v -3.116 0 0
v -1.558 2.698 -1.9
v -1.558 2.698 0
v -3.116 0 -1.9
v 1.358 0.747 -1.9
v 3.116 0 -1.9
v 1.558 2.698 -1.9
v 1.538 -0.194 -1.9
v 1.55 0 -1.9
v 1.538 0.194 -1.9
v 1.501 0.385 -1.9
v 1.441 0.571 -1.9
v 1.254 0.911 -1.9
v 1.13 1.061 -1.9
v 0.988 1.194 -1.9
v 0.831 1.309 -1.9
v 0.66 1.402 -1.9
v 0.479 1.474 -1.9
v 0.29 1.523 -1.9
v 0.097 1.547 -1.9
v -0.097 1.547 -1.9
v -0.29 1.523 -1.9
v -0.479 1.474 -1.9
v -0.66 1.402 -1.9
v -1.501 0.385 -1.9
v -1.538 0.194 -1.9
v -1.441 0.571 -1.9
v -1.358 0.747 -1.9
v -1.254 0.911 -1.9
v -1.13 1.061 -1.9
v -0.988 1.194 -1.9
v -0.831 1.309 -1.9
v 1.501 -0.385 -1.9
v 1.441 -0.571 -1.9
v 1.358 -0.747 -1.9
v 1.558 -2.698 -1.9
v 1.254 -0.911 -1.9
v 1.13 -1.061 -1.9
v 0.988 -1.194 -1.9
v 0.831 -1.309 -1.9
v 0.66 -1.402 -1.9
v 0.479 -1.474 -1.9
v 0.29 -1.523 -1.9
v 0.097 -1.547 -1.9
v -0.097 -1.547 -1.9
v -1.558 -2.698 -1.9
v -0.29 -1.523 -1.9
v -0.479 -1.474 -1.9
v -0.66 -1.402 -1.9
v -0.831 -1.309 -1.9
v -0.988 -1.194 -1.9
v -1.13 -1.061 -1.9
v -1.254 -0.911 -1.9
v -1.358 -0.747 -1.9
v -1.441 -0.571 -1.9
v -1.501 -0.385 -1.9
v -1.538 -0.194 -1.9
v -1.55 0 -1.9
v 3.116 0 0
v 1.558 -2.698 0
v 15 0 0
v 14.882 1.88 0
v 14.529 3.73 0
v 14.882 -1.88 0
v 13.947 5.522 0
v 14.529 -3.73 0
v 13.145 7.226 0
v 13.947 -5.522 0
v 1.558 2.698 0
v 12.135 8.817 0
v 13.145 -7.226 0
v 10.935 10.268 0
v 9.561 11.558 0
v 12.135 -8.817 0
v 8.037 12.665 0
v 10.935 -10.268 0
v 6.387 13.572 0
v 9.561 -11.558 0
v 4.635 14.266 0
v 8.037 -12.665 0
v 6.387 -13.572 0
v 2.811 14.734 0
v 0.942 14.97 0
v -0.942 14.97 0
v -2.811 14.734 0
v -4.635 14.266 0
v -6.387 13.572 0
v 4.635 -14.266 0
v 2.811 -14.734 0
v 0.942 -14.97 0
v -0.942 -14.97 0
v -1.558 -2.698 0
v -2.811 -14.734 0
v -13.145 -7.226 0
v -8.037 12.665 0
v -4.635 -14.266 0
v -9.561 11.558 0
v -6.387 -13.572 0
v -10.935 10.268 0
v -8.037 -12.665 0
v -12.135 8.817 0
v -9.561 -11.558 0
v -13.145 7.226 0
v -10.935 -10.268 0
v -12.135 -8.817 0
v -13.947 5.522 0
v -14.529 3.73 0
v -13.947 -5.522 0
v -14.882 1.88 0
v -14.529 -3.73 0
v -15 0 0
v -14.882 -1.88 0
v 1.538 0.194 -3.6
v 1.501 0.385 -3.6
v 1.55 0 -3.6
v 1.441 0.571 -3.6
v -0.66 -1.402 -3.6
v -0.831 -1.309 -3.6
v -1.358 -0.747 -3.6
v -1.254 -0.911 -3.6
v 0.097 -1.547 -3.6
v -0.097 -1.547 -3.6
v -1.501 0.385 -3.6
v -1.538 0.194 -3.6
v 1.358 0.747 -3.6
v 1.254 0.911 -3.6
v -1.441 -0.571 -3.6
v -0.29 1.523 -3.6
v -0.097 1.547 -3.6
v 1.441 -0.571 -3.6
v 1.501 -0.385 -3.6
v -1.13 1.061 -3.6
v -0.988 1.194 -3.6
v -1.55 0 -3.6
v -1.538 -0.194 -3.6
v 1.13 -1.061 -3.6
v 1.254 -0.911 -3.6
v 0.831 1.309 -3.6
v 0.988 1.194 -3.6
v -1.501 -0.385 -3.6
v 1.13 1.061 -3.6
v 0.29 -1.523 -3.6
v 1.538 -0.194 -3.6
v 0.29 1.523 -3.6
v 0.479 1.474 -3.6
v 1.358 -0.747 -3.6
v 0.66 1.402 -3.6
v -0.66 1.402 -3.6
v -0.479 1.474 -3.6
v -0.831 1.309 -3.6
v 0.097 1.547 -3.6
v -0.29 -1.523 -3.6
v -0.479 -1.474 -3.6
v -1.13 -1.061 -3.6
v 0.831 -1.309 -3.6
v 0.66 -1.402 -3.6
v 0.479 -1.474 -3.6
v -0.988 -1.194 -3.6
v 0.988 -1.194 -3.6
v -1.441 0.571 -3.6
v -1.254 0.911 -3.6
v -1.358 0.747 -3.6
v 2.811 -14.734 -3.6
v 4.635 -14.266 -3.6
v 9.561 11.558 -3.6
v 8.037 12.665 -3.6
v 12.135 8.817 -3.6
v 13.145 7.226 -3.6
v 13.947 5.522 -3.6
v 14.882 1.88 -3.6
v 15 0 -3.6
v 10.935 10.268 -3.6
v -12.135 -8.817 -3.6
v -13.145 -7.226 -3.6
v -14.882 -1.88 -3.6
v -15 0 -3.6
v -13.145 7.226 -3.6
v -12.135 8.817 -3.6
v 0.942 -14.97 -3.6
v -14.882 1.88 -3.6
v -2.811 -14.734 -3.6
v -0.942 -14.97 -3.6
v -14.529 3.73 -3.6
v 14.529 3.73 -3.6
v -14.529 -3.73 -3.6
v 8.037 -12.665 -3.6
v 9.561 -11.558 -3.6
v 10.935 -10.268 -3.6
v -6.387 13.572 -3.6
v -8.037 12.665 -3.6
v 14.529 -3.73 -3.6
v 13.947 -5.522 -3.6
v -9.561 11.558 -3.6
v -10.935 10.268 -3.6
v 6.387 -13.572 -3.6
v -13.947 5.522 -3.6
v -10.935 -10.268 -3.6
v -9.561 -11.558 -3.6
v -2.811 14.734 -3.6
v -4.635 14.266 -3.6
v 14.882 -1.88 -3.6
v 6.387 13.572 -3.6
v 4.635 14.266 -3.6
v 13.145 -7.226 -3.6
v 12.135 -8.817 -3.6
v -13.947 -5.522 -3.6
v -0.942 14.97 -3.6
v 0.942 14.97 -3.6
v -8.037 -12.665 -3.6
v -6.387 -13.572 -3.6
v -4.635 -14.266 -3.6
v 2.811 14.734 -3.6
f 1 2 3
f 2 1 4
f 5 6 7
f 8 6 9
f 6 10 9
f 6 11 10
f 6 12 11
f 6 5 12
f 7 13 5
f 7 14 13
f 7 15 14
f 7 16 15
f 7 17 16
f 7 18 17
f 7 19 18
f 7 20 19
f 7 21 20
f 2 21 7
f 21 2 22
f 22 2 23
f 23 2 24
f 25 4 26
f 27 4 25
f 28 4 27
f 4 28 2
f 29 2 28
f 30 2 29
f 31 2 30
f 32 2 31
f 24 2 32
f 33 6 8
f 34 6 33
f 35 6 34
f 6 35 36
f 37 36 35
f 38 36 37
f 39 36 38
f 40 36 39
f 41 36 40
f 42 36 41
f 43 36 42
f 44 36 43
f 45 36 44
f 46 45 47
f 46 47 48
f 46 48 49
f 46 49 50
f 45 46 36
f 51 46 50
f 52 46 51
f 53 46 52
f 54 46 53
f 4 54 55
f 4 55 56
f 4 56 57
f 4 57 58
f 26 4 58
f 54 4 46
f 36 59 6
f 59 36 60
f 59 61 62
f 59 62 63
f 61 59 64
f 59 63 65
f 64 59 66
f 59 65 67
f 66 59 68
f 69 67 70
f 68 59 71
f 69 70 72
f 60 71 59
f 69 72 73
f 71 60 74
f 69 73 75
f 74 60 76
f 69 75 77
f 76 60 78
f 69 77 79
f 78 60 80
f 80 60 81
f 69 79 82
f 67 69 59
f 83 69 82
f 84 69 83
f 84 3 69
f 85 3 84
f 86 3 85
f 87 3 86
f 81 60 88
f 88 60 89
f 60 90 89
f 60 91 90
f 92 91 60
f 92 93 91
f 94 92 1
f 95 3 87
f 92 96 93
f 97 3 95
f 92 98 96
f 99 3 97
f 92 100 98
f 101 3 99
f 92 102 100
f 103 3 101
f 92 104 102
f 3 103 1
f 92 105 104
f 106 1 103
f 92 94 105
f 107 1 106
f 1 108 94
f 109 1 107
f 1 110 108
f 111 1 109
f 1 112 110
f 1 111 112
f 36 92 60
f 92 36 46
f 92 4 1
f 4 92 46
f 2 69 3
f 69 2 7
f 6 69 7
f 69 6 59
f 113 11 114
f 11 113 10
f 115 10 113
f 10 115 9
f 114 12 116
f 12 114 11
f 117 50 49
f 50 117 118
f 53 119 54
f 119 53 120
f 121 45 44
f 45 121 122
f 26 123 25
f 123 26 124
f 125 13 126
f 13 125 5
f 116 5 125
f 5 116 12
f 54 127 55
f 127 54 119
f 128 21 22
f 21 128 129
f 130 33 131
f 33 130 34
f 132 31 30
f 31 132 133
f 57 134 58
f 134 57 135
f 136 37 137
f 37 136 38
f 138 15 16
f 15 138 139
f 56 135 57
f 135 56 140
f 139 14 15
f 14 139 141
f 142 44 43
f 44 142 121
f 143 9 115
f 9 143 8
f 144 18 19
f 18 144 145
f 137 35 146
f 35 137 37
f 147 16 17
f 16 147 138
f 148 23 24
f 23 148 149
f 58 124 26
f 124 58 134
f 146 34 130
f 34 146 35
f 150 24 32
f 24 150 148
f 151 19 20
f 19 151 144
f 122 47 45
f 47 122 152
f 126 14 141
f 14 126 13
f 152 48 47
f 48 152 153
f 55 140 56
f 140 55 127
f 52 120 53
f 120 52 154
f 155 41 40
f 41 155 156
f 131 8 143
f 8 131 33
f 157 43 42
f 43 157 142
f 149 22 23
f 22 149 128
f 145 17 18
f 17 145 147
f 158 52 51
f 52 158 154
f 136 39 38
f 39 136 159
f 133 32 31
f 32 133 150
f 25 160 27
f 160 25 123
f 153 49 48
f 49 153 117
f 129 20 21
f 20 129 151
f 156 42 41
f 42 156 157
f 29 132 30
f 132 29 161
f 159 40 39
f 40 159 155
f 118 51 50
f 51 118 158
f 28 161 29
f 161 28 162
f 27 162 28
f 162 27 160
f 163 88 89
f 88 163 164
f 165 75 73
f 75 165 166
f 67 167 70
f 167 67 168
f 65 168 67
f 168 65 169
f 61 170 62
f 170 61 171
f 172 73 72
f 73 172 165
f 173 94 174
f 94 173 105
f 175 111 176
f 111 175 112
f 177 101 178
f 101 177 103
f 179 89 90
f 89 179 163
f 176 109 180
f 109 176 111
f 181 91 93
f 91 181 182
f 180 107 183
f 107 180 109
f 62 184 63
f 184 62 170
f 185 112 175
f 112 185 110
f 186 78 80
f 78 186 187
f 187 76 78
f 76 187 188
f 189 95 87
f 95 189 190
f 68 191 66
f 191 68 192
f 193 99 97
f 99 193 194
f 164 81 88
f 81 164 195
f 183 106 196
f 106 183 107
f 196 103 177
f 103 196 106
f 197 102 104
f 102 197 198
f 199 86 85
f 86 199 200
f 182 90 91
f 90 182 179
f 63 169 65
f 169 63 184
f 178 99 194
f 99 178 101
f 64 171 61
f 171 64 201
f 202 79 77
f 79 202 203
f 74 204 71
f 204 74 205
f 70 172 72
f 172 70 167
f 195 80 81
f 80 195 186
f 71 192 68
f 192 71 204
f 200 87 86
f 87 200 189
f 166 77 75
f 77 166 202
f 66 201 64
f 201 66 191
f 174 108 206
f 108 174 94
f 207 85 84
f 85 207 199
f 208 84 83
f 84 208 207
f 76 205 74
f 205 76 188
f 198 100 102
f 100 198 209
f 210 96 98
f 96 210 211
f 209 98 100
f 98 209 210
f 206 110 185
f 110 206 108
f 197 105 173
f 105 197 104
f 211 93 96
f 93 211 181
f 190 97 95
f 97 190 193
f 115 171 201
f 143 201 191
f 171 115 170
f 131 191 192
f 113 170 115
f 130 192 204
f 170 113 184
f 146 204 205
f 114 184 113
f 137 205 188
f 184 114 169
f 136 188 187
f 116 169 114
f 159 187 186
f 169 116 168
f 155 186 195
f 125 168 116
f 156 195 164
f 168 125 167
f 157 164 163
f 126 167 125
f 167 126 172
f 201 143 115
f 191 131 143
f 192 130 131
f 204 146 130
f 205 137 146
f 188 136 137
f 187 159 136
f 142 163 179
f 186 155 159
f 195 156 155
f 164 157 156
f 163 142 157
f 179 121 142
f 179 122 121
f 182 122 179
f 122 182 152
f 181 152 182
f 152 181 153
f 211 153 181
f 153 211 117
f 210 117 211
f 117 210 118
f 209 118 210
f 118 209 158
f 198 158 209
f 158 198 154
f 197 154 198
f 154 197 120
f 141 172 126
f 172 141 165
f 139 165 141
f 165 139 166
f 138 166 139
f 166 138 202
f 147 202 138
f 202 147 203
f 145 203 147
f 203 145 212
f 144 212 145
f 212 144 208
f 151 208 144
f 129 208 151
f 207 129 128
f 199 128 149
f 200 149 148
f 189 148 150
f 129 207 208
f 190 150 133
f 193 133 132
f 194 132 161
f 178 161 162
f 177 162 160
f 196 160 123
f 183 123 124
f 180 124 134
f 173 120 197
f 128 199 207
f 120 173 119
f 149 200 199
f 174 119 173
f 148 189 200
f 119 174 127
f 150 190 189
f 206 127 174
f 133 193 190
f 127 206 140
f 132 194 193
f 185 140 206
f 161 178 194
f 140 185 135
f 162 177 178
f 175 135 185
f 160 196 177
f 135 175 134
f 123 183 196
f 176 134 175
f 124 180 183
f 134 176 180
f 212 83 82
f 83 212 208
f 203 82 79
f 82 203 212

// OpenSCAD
$fn = 50;


difference() {
	union() {
		translate(v = [0, 0, -3.6000000000]) {
			cylinder(h = 3.6000000000, r = 15.0000000000);
		}
	}
	union() {
		translate(v = [0, 0, 0]) {
			rotate(a = [0, 0, 0]) {
				difference() {
					union() {
						translate(v = [0, 0, -1.9000000000]) {
							linear_extrude(height = 1.9000000000) {
								polygon(points = [[3.1158000000, 0.0000000000], [1.5579000000, 2.6983619531], [-1.5579000000, 2.6983619531], [-3.1158000000, 0.0000000000], [-1.5579000000, -2.6983619531], [1.5579000000, -2.6983619531]]);
							}
						}
					}
					union();
				}
			}
		}
		#translate(v = [0, 0, -100.0000000000]) {
			cylinder(h = 200, r = 1.5500000000);
		}
	}
}
